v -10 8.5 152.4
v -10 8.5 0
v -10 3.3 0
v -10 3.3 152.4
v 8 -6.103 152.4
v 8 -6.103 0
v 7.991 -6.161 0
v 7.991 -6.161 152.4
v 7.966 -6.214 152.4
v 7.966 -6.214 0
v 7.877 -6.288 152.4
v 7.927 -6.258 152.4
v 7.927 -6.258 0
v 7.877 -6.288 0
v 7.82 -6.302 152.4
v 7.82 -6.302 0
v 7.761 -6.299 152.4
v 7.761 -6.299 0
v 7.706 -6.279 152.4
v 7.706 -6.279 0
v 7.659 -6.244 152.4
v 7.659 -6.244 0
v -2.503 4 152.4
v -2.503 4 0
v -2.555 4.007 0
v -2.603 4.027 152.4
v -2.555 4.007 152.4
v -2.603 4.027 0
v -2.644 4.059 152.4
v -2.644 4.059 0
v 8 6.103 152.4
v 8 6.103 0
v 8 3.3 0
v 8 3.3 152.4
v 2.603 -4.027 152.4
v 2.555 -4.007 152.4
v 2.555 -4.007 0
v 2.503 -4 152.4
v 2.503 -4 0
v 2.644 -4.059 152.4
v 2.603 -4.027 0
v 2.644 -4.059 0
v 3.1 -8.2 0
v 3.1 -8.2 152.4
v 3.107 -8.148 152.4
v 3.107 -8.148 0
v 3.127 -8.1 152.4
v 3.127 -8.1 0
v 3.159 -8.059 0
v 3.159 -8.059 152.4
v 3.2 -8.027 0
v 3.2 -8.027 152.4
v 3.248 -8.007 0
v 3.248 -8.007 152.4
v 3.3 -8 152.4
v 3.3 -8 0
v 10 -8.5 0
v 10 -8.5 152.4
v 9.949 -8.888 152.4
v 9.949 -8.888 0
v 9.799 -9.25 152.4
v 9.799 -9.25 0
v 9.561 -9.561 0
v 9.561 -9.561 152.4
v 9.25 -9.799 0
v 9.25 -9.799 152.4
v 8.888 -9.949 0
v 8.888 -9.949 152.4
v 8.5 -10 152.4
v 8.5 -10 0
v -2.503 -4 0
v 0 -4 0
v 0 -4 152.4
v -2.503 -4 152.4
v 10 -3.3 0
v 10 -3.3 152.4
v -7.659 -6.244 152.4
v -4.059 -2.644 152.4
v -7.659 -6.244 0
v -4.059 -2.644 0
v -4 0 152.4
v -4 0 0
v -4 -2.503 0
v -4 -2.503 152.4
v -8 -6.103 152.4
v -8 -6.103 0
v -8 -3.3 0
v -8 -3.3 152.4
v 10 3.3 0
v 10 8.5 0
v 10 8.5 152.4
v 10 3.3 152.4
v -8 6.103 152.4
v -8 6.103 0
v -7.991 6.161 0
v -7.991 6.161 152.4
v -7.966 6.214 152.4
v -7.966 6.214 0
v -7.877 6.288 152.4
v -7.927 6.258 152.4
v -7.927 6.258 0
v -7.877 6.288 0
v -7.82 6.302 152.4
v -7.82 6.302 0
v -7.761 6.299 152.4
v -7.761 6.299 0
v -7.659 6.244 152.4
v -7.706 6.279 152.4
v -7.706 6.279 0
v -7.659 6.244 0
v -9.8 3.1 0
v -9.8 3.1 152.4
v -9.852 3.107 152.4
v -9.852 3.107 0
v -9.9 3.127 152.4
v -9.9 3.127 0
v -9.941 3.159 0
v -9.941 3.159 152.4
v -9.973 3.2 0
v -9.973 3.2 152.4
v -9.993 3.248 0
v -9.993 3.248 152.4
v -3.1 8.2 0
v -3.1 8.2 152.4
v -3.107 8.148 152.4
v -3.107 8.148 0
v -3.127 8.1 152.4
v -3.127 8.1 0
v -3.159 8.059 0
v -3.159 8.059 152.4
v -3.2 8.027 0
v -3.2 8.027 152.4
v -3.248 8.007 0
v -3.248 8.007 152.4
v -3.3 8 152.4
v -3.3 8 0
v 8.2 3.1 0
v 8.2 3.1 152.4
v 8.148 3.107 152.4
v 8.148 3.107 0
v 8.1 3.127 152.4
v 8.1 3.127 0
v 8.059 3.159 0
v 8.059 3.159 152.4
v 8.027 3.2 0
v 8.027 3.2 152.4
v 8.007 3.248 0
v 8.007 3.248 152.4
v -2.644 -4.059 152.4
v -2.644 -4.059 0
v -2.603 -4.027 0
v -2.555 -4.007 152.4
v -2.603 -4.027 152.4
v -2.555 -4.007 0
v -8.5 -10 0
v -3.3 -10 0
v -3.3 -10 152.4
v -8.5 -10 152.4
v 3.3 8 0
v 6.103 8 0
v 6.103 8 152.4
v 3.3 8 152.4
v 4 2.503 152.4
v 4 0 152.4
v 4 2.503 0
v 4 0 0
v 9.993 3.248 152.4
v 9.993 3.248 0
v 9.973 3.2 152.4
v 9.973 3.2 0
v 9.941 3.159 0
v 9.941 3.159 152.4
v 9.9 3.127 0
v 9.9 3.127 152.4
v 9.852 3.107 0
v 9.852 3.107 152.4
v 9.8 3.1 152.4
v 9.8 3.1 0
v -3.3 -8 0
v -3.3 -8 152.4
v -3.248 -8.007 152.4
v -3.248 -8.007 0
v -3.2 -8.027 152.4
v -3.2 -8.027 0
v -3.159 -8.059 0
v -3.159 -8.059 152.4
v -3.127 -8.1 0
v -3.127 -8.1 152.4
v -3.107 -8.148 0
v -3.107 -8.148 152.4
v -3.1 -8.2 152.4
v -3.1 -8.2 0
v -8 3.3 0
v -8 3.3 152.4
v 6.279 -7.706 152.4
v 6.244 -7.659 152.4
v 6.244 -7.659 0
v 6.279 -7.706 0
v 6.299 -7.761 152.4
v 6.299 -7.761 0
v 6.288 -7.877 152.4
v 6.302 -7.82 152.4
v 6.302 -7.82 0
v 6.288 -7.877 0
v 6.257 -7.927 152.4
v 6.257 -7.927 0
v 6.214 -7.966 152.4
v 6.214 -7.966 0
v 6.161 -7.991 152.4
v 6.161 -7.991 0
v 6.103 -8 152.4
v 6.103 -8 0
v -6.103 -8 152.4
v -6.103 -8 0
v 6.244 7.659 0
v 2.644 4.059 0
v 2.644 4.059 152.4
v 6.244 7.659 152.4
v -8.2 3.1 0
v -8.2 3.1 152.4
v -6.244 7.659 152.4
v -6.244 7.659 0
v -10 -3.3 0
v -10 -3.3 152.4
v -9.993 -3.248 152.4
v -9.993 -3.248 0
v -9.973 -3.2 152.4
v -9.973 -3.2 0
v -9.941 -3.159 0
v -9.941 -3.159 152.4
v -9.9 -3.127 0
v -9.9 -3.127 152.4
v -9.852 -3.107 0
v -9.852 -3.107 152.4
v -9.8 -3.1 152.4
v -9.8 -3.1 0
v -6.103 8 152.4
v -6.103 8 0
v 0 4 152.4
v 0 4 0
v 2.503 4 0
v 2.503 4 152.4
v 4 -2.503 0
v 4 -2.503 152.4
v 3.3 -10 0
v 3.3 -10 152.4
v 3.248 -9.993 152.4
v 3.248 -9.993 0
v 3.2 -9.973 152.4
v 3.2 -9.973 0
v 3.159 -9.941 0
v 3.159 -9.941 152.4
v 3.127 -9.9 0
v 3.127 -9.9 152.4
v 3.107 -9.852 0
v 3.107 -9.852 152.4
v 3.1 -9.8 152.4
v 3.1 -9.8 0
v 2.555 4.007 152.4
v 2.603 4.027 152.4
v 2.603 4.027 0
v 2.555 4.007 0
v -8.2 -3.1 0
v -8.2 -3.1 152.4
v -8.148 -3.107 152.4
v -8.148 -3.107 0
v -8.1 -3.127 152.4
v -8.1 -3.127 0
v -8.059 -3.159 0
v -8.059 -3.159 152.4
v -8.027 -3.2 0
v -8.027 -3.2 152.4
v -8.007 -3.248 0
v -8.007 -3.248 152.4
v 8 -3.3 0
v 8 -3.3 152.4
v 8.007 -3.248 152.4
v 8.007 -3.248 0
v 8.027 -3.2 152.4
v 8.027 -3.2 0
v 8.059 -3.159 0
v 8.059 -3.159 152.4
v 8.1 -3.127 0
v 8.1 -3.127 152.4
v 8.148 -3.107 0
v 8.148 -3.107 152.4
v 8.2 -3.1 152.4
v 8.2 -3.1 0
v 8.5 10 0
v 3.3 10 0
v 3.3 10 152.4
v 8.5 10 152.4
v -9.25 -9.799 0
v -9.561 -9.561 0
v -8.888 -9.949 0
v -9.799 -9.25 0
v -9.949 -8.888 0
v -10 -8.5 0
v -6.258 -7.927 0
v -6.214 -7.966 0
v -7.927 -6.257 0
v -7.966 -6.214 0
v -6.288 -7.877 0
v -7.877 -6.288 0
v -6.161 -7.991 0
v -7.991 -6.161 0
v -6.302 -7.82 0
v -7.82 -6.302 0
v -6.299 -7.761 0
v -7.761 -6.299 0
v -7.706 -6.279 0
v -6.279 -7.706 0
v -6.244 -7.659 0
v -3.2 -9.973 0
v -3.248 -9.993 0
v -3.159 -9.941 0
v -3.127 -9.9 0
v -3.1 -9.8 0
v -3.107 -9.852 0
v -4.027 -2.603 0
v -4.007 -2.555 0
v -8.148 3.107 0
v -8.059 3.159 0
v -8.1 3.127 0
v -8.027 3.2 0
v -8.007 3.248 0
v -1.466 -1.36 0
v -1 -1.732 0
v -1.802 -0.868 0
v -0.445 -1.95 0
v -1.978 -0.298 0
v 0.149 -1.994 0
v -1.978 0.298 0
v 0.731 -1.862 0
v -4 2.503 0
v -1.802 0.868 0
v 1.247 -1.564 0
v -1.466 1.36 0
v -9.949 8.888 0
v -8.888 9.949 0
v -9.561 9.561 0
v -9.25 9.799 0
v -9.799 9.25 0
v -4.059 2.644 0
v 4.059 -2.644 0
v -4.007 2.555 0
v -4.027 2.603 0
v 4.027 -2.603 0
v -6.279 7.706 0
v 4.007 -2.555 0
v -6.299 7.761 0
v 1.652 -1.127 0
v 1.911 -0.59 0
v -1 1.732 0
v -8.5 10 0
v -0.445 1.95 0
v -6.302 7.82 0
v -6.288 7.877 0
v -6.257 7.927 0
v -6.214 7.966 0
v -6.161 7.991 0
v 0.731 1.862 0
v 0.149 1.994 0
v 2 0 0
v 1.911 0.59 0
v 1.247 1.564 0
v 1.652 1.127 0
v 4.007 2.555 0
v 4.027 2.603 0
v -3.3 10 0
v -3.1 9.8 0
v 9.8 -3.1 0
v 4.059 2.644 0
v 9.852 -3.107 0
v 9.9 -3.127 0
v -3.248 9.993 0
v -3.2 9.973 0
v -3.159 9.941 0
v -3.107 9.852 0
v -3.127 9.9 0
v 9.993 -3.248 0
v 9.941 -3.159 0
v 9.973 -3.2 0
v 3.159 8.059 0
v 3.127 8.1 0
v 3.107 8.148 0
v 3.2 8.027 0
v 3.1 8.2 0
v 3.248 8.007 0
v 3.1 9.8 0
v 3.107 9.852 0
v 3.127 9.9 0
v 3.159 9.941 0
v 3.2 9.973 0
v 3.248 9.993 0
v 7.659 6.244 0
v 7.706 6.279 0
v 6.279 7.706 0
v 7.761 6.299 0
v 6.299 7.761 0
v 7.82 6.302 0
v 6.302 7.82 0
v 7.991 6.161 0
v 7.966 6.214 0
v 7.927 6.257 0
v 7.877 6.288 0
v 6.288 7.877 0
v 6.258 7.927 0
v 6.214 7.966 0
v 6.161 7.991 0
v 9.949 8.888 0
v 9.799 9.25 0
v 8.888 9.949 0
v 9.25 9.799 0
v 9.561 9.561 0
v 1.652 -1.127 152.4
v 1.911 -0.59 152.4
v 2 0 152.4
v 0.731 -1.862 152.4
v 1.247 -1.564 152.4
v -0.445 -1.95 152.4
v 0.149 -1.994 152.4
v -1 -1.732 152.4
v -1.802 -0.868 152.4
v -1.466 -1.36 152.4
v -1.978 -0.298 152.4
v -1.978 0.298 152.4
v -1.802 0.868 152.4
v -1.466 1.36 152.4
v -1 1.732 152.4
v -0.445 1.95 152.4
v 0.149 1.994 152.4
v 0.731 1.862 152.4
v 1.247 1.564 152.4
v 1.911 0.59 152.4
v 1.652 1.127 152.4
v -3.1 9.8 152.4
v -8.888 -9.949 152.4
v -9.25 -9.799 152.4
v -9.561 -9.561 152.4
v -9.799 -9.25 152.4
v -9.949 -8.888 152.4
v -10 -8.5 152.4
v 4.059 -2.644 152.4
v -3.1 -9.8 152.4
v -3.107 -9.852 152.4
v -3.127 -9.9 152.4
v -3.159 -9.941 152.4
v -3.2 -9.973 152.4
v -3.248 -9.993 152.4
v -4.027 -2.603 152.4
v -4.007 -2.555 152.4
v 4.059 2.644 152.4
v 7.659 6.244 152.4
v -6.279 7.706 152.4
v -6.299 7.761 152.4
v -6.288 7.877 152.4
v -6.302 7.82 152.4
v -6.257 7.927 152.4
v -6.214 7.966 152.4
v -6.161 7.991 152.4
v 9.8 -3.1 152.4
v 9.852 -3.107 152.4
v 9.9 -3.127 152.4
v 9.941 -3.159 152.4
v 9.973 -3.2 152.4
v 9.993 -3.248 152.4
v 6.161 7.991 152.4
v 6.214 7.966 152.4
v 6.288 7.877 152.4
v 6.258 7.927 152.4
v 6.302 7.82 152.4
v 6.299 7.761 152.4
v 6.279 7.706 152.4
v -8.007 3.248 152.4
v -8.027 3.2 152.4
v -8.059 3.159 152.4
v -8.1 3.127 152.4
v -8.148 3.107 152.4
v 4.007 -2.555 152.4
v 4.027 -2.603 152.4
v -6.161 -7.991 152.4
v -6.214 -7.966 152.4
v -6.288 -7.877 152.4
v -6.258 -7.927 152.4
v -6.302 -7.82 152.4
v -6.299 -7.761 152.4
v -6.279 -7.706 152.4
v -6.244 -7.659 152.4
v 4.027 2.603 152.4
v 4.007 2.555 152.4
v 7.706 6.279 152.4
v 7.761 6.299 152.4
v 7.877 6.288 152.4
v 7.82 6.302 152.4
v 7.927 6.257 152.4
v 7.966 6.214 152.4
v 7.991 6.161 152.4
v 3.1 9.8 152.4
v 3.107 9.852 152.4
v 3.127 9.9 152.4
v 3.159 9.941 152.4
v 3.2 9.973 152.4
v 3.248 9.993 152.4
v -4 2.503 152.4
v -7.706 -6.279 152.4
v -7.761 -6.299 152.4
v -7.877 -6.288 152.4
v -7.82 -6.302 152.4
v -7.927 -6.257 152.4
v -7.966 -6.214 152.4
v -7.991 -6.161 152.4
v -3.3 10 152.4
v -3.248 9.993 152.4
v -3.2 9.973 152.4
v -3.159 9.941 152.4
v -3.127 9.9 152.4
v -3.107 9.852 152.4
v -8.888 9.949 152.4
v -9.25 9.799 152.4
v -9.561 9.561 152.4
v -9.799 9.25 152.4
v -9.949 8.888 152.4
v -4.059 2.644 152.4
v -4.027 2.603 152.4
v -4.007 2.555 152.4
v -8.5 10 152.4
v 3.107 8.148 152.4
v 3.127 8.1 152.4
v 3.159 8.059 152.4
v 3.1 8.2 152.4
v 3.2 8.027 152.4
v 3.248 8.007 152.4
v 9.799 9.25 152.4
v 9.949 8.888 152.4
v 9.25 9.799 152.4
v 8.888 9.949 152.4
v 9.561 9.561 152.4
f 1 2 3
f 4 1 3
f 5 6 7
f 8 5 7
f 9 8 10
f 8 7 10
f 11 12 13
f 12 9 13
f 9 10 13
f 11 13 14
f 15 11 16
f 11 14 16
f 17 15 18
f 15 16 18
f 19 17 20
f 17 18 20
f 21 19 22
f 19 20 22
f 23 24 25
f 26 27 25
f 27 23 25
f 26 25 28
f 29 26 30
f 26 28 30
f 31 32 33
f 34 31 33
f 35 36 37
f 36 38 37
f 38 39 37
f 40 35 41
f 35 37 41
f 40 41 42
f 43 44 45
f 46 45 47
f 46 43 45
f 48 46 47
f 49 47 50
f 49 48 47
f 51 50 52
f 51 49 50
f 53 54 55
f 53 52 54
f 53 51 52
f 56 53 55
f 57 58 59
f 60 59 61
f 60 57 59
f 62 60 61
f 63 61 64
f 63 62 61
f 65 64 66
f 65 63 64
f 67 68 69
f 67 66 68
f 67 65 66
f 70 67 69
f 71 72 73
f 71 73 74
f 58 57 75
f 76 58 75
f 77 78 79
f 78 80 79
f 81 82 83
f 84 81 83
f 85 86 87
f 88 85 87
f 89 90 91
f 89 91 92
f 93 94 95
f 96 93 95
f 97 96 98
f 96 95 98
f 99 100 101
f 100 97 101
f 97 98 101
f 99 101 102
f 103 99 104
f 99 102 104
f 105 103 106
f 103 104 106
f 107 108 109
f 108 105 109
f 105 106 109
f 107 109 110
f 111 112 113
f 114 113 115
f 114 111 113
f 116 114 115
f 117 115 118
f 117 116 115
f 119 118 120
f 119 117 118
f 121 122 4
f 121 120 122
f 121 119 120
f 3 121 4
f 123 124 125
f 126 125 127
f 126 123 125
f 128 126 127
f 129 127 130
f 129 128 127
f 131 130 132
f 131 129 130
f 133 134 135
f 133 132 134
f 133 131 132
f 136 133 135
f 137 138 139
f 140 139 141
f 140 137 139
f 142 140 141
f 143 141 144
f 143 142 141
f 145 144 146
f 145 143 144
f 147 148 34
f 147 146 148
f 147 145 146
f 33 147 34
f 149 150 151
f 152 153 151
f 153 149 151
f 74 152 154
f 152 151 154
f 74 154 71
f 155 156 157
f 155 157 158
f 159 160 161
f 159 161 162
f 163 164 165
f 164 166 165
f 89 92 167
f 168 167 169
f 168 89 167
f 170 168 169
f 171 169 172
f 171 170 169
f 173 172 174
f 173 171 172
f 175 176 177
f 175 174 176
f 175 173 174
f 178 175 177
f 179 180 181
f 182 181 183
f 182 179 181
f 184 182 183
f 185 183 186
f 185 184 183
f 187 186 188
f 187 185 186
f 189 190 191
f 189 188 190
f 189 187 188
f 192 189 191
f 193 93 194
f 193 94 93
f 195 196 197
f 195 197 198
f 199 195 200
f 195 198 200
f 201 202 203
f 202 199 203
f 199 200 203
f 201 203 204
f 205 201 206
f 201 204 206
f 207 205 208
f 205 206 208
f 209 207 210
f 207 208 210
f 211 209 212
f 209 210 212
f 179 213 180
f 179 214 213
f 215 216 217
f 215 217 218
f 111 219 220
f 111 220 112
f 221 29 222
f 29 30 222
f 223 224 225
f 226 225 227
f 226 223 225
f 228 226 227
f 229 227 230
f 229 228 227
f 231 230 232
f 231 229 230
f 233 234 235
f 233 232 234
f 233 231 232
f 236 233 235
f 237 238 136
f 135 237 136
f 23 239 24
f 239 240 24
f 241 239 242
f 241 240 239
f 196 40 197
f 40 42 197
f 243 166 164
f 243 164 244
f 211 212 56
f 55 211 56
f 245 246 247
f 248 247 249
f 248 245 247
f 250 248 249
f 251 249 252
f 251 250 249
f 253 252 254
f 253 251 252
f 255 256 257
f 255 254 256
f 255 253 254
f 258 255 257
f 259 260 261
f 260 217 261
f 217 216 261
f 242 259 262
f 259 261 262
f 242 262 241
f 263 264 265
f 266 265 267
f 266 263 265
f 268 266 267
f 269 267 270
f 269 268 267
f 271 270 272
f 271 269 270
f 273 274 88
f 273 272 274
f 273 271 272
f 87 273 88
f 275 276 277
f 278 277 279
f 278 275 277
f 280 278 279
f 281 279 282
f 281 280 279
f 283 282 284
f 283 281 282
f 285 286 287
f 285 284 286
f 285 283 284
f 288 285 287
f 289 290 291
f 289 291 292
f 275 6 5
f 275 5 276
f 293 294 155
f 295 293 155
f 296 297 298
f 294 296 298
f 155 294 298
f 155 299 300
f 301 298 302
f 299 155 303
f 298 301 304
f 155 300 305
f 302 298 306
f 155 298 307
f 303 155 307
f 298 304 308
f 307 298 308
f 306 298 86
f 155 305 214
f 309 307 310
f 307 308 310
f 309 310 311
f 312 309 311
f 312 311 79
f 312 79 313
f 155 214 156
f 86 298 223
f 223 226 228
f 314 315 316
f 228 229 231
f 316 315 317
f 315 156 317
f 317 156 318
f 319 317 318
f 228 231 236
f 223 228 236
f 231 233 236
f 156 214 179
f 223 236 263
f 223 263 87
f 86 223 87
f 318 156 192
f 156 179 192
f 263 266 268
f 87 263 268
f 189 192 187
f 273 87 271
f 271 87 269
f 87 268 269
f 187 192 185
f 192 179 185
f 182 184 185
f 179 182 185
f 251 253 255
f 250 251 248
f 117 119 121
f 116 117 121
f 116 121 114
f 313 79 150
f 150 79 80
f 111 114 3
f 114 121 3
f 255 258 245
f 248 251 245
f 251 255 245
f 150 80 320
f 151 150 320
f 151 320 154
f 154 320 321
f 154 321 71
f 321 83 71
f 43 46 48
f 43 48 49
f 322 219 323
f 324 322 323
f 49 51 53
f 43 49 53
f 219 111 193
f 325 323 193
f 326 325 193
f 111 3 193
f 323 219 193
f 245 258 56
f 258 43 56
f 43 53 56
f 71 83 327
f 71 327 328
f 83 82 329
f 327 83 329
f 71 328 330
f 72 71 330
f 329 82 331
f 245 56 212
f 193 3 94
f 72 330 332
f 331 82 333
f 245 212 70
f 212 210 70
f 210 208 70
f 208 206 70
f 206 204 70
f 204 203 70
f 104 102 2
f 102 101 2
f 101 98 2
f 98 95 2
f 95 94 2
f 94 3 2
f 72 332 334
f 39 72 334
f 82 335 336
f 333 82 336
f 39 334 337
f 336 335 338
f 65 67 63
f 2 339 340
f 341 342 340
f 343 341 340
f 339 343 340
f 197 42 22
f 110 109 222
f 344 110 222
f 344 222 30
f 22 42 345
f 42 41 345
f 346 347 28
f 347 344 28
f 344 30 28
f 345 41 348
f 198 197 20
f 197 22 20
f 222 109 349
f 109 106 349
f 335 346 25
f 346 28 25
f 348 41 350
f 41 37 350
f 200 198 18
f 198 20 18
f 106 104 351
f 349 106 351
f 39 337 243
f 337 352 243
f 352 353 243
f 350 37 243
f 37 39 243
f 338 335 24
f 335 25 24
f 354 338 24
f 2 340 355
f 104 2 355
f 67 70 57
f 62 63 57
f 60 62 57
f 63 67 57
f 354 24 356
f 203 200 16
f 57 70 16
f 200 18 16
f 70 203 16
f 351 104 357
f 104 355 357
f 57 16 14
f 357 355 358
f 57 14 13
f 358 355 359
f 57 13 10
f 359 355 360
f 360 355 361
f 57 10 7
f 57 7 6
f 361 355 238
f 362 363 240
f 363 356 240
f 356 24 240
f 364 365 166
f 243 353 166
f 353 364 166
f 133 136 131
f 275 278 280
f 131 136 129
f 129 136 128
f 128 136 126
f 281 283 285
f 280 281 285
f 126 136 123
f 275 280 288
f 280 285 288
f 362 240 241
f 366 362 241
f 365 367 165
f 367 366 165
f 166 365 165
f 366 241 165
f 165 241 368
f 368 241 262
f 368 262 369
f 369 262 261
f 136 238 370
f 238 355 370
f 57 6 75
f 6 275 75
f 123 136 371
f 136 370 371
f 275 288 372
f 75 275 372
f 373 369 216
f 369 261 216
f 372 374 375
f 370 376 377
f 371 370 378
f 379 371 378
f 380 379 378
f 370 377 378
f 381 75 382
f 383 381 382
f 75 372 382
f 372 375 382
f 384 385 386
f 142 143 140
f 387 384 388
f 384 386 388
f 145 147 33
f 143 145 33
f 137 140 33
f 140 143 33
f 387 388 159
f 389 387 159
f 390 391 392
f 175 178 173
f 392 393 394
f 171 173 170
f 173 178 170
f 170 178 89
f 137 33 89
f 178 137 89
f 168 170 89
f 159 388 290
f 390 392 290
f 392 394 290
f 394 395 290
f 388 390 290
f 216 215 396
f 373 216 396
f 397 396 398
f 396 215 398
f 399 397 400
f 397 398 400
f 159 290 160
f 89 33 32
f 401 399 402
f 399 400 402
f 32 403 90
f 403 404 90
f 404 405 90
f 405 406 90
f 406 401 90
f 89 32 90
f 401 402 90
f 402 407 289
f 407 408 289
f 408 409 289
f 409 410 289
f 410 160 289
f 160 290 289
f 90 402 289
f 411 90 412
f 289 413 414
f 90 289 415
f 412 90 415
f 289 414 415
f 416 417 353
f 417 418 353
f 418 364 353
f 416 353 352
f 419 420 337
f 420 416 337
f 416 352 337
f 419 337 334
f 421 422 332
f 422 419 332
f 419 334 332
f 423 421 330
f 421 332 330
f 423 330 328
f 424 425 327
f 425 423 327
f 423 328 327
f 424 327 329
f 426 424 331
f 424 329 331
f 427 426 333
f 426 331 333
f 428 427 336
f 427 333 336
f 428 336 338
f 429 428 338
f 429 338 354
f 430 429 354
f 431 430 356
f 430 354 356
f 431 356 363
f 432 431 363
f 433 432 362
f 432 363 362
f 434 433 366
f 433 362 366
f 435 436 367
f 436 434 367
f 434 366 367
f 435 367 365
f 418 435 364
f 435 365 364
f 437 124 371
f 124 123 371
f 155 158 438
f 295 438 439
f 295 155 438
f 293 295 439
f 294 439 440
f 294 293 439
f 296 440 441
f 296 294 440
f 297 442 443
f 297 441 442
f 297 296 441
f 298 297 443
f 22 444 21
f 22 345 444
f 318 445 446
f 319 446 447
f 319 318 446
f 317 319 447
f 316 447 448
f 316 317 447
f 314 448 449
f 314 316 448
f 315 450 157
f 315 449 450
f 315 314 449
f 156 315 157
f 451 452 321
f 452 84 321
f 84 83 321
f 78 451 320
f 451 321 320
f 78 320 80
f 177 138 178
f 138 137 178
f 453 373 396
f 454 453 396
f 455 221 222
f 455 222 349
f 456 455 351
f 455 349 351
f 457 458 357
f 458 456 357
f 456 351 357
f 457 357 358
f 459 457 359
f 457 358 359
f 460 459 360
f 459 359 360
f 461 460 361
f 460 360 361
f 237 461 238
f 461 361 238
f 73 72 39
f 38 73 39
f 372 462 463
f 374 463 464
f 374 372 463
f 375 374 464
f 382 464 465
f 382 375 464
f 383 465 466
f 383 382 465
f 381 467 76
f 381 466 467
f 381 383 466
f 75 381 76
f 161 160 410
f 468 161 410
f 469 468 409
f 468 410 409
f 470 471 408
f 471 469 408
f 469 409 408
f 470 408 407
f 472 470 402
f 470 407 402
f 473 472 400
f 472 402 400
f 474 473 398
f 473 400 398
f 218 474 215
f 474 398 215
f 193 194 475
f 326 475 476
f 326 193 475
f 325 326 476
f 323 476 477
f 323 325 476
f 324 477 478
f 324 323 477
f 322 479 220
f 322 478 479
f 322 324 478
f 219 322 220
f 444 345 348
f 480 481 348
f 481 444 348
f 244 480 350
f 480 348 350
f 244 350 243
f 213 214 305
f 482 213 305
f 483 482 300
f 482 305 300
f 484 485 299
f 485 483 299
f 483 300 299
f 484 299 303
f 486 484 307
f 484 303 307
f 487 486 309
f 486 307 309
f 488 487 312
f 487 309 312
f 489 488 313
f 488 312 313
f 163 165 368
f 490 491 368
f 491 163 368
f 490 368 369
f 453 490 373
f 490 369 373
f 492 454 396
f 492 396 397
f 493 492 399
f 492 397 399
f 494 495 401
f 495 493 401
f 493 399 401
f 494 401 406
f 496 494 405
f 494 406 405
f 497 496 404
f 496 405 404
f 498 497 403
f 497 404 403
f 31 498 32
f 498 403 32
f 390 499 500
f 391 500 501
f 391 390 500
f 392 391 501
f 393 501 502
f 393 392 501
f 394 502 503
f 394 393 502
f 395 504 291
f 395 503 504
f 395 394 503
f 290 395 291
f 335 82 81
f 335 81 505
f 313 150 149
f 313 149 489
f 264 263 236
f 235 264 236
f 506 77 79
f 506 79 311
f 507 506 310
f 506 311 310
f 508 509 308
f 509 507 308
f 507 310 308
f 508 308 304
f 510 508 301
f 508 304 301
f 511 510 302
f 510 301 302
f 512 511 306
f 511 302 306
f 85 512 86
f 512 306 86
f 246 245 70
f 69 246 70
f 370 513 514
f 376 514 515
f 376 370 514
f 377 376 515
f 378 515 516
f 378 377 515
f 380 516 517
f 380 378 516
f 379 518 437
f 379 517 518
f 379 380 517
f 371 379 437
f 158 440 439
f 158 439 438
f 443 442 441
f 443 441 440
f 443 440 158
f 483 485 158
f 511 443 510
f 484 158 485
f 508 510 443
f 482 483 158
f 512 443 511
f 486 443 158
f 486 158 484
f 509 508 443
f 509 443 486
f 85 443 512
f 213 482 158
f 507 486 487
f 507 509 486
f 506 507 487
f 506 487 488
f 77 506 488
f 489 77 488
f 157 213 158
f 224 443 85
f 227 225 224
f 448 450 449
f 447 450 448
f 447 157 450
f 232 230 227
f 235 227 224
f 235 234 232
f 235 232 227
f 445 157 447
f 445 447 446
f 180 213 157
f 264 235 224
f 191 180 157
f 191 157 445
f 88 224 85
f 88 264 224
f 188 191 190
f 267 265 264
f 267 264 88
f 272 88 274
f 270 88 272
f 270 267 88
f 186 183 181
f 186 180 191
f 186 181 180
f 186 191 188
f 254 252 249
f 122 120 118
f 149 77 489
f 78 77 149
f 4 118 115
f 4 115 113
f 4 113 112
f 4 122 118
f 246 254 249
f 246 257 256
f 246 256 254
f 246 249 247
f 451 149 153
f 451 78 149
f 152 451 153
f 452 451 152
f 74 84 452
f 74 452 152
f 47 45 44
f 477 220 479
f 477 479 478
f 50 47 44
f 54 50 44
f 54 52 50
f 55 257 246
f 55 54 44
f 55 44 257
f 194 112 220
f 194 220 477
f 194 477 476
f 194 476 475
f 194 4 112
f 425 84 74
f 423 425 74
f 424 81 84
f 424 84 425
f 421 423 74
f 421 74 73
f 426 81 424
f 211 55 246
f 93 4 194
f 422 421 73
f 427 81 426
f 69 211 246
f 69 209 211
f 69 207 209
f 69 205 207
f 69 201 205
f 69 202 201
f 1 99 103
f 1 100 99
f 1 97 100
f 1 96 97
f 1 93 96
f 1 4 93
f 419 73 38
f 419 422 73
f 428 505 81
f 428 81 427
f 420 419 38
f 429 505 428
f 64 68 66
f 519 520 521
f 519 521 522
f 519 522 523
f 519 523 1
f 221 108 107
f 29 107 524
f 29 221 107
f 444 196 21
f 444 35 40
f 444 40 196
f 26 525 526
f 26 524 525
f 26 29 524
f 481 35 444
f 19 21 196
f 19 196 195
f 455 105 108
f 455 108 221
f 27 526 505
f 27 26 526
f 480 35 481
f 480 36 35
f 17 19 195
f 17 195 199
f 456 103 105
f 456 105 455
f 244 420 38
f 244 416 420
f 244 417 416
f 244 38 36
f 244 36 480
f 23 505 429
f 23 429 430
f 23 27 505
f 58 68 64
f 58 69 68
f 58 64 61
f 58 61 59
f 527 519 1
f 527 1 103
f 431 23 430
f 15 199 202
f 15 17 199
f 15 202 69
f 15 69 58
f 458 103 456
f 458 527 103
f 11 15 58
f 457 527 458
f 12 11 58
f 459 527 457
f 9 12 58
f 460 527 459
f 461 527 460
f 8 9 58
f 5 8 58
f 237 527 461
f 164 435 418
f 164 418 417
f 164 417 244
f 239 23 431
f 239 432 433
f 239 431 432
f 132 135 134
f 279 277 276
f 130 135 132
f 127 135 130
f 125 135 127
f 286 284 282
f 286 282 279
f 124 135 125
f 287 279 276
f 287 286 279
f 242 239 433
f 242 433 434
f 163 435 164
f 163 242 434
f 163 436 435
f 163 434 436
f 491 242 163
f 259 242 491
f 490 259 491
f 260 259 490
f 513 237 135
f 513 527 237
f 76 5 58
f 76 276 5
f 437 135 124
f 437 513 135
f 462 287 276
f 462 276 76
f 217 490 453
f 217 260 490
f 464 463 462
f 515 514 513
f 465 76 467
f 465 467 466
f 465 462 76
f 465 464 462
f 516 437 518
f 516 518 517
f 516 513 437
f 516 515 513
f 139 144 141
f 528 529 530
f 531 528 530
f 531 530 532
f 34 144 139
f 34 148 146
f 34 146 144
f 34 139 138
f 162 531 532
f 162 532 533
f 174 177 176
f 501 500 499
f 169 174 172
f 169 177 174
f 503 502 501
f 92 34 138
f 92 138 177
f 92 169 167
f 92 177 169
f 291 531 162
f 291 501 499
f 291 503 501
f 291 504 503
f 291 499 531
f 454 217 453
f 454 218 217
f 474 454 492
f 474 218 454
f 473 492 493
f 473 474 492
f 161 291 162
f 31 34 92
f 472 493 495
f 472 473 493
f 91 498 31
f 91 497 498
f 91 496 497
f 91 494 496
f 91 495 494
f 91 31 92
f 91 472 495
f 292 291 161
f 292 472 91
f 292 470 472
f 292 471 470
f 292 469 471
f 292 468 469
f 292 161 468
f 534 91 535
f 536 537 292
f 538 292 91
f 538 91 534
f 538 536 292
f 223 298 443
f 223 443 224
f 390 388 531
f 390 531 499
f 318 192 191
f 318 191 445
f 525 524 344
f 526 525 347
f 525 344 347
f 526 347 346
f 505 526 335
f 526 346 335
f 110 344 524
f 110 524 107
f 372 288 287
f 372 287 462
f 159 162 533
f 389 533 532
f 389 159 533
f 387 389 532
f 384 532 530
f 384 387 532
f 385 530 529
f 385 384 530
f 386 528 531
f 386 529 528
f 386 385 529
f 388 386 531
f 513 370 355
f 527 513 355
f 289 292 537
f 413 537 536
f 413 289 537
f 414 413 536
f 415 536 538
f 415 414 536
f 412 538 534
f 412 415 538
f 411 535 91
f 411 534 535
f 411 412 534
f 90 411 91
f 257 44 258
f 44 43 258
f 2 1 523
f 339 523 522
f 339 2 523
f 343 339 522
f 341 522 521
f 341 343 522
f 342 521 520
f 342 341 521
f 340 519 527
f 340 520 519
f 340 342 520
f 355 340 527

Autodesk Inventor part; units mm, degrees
ref_plane "YZ Plane" through (0, 0, 0) normal (1, 0, 0) x (0, 1, 0)
ref_plane "XZ Plane" through (0, 0, 0) normal (0, 1, 0) x (-1, 0, 0)
ref_plane "XY Plane" through (0, 0, 0) normal (0, 0, 1) x (1, 0, 0)
sketch "Sketch1" plane through (0, 0, 0) normal (0, 0, 1) x (1, 0, 0)
  line L0 (-10, 10) -> (10, 10) construction
  line L1 (10, 10) -> (10, -10) construction
  line L2 (10, -10) -> (-10, -10) construction
  line L3 (-10, -10) -> (-10, 10) construction
  line L4 (-10, 10) -> (10, -10) construction
  line L5 (10, 10) -> (-10, -10) construction
  circle A0 centre (0, 0) radius 2
  line L6 (-4, -4) -> (4, -4) construction
  line L7 (4, -4) -> (4, 4) construction
  line L8 (4, 4) -> (-4, 4) construction
  line L9 (-4, 4) -> (-4, -4) construction
  line L10 (-4, -4) -> (4, 4) construction
  line L11 (4, -4) -> (-4, 4) construction
  line L12 (2.6444, 4.0586) -> (6.2444, 7.6586)
  line L13 (6.1029, 8) -> (3.3, 8)
  line L14 (3.1, 8.2) -> (3.1, 9.8)
  line L15 (3.3, 10) -> (8.5, 10)
  line L16 (4.0586, 2.6444) -> (7.6586, 6.2444)
  line L17 (8, 6.1029) -> (8, 3.3)
  line L18 (8.2, 3.1) -> (9.8, 3.1)
  line L19 (10, 8.5) -> (10, 3.3)
  line L20 (0, 4) -> (2.5029, 4)
  line L21 (4, 0) -> (4, 2.5029)
  line L22 (0, 10) -> (0, -10) construction
  line L23 (-10, 0) -> (10, 0) construction
  line L24 (-2.6444, 4.0586) -> (-6.2444, 7.6586)
  line L25 (-6.1029, 8) -> (-3.3, 8)
  line L26 (-3.1, 8.2) -> (-3.1, 9.8)
  line L27 (-3.3, 10) -> (-8.5, 10)
  line L28 (-4.0586, 2.6444) -> (-7.6586, 6.2444)
  line L29 (-8, 6.1029) -> (-8, 3.3)
  line L30 (-8.2, 3.1) -> (-9.8, 3.1)
  line L31 (-10, 8.5) -> (-10, 3.3)
  line L32 (0, 4) -> (-2.5029, 4)
  line L33 (-4, 0) -> (-4, 2.5029)
  line L34 (2.6444, -4.0586) -> (6.2444, -7.6586)
  line L35 (6.1029, -8) -> (3.3, -8)
  line L36 (3.1, -8.2) -> (3.1, -9.8)
  line L37 (3.3, -10) -> (8.5, -10)
  line L38 (4.0586, -2.6444) -> (7.6586, -6.2444)
  line L39 (8, -6.1029) -> (8, -3.3)
  line L40 (8.2, -3.1) -> (9.8, -3.1)
  line L41 (10, -8.5) -> (10, -3.3)
  line L42 (0, -4) -> (2.5029, -4)
  line L43 (4, 0) -> (4, -2.5029)
  line L44 (0, -4) -> (-2.5029, -4)
  line L45 (-2.6444, -4.0586) -> (-6.2444, -7.6586)
  line L46 (-6.1029, -8) -> (-3.3, -8)
  line L47 (-3.1, -8.2) -> (-3.1, -9.8)
  line L48 (-3.3, -10) -> (-8.5, -10)
  line L49 (-4.0586, -2.6444) -> (-7.6586, -6.2444)
  line L50 (-4, 0) -> (-4, -2.5029)
  line L51 (-8, -6.1029) -> (-8, -3.3)
  line L52 (-8.2, -3.1) -> (-9.8, -3.1)
  line L53 (-10, -8.5) -> (-10, -3.3)
  arc A1 (10, 8.5) -> (8.5, 10) centre (8.5, 8.5) ccw
  arc A2 (-8.5, 10) -> (-10, 8.5) centre (-8.5, 8.5) ccw
  arc A3 (-10, -8.5) -> (-8.5, -10) centre (-8.5, -8.5) ccw
  arc A4 (8.5, -10) -> (10, -8.5) centre (8.5, -8.5) ccw
  arc A5 (-3.1, 9.8) -> (-3.3, 10) centre (-3.3, 9.8) ccw
  arc A6 (-3.3, 8) -> (-3.1, 8.2) centre (-3.3, 8.2) ccw
  arc A7 (-6.1029, 8) -> (-6.2444, 7.6586) centre (-6.1029, 7.8) ccw
  arc A8 (6.2444, 7.6586) -> (6.1029, 8) centre (6.1029, 7.8) ccw
  arc A9 (-8, -6.1029) -> (-7.6586, -6.2444) centre (-7.8, -6.1029) ccw
  arc A10 (-3.1, -8.2) -> (-3.3, -8) centre (-3.3, -8.2) ccw
  arc A11 (6.1029, -8) -> (6.2444, -7.6586) centre (6.1029, -7.8) ccw
  arc A12 (3.3, -8) -> (3.1, -8.2) centre (3.3, -8.2) ccw
  arc A13 (-6.2444, -7.6586) -> (-6.1029, -8) centre (-6.1029, -7.8) ccw
  arc A14 (7.6586, -6.2444) -> (8, -6.1029) centre (7.8, -6.1029) ccw
  arc A15 (8.2, -3.1) -> (8, -3.3) centre (8.2, -3.3) ccw
  arc A16 (8, 6.1029) -> (7.6586, 6.2444) centre (7.8, 6.1029) ccw
  arc A17 (8, 3.3) -> (8.2, 3.1) centre (8.2, 3.3) ccw
  arc A18 (3.3, 10) -> (3.1, 9.8) centre (3.3, 9.8) ccw
  arc A19 (-2.6444, 4.0586) -> (-2.5029, 4) centre (-2.5029, 4.2) ccw
  arc A20 (2.5029, 4) -> (2.6444, 4.0586) centre (2.5029, 4.2) ccw
  arc A21 (4.0586, 2.6444) -> (4, 2.5029) centre (4.2, 2.5029) ccw
  arc A22 (4, -2.5029) -> (4.0586, -2.6444) centre (4.2, -2.5029) ccw
  arc A23 (2.6444, -4.0586) -> (2.5029, -4) centre (2.5029, -4.2) ccw
  arc A24 (-2.5029, -4) -> (-2.6444, -4.0586) centre (-2.5029, -4.2) ccw
  arc A25 (-4.0586, -2.6444) -> (-4, -2.5029) centre (-4.2, -2.5029) ccw
  arc A26 (-4, 2.5029) -> (-4.0586, 2.6444) centre (-4.2, 2.5029) ccw
  arc A27 (-7.6586, 6.2444) -> (-8, 6.1029) centre (-7.8, 6.1029) ccw
  arc A28 (-8.2, 3.1) -> (-8, 3.3) centre (-8.2, 3.3) ccw
  arc A29 (-10, 3.3) -> (-9.8, 3.1) centre (-9.8, 3.3) ccw
  arc A30 (-8, -3.3) -> (-8.2, -3.1) centre (-8.2, -3.3) ccw
  arc A31 (-9.8, -3.1) -> (-10, -3.3) centre (-9.8, -3.3) ccw
  arc A32 (-3.3, -10) -> (-3.1, -9.8) centre (-3.3, -9.8) ccw
  arc A33 (3.1, -9.8) -> (3.3, -10) centre (3.3, -9.8) ccw
  arc A34 (10, -3.3) -> (9.8, -3.1) centre (9.8, -3.3) ccw
  arc A35 (9.8, 3.1) -> (10, 3.3) centre (9.8, 3.3) ccw
  arc A36 (3.1, 8.2) -> (3.3, 8) centre (3.3, 8.2) ccw
  point P0 (2.5858, 4)
  point P1 (6.5858, 8)
  point P2 (3.1, 8)
  point P3 (3.1, 10)
  point P4 (4, 2.5858)
  point P5 (8, 6.5858)
  point P6 (8, 3.1)
  point P7 (10, 3.1)
  point P8 (-2.5858, 4)
  point P9 (-6.5858, 8)
  point P10 (-3.1, 8)
  point P11 (-3.1, 10)
  point P12 (-4, 2.5858)
  point P13 (-8, 6.5858)
  point P14 (-8, 3.1)
  point P15 (-10, 3.1)
  point P16 (2.5858, -4)
  point P17 (6.5858, -8)
  point P18 (3.1, -8)
  point P19 (3.1, -10)
  point P20 (4, -2.5858)
  point P21 (8, -6.5858)
  point P22 (8, -3.1)
  point P23 (10, -3.1)
  point P24 (-2.5858, -4)
  point P25 (-6.5858, -8)
  point P26 (-3.1, -8)
  point P27 (-3.1, -10)
  point P28 (-4, -2.5858)
  point P29 (-8, -6.5858)
  point P30 (-8, -3.1)
  point P31 (-10, -3.1)
  dimension "d0" = 20
  dimension "d1" = 20
  dimension "d2" = 4
  dimension "d5" = 6
  dimension "t" = 2
  dimension "d7" = 1
  dimension "d8" = 2
  dimension "d9" = 2
  dimension "d10" = 3.1
  dimension "d11" = 3.1
  dimension "d15" = 1.5
  dimension "d16" = 1.5
  dimension "d17" = 1.5
  dimension "d18" = 1.5
  dimension "d19" = 0.2
  dimension "d20" = 0.2
  dimension "d21" = 0.2
  dimension "d22" = 0.2
  dimension "d23" = 0.2
  dimension "d24" = 0.2
  dimension "d25" = 0.2
  dimension "d26" = 0.2
  dimension "d27" = 0.2
  dimension "d28" = 0.2
  dimension "d29" = 0.2
  dimension "d30" = 0.2
  dimension "d31" = 0.2
  dimension "d32" = 0.2
  dimension "d33" = 0.2
  dimension "d34" = 0.2
  dimension "d35" = 0.2
  dimension "d36" = 0.2
  dimension "d37" = 0.2
  dimension "d38" = 0.2
  dimension "d39" = 0.2
  dimension "d40" = 0.2
  dimension "d41" = 0.2
extrude "2020 Al T-S (1000mm)" add sketch "Sketch1" along normal blind 152.4
equation "\"d1\" = d0"
equation "\"d7\" = 0.5 * t"
equation "\"d8\" = t"
equation "\"d9\" = t"
equation "\"d11\" = d10"
properties part number "2020 Aluminium Extrusion T-Slot" material "Aluminum 6061"
